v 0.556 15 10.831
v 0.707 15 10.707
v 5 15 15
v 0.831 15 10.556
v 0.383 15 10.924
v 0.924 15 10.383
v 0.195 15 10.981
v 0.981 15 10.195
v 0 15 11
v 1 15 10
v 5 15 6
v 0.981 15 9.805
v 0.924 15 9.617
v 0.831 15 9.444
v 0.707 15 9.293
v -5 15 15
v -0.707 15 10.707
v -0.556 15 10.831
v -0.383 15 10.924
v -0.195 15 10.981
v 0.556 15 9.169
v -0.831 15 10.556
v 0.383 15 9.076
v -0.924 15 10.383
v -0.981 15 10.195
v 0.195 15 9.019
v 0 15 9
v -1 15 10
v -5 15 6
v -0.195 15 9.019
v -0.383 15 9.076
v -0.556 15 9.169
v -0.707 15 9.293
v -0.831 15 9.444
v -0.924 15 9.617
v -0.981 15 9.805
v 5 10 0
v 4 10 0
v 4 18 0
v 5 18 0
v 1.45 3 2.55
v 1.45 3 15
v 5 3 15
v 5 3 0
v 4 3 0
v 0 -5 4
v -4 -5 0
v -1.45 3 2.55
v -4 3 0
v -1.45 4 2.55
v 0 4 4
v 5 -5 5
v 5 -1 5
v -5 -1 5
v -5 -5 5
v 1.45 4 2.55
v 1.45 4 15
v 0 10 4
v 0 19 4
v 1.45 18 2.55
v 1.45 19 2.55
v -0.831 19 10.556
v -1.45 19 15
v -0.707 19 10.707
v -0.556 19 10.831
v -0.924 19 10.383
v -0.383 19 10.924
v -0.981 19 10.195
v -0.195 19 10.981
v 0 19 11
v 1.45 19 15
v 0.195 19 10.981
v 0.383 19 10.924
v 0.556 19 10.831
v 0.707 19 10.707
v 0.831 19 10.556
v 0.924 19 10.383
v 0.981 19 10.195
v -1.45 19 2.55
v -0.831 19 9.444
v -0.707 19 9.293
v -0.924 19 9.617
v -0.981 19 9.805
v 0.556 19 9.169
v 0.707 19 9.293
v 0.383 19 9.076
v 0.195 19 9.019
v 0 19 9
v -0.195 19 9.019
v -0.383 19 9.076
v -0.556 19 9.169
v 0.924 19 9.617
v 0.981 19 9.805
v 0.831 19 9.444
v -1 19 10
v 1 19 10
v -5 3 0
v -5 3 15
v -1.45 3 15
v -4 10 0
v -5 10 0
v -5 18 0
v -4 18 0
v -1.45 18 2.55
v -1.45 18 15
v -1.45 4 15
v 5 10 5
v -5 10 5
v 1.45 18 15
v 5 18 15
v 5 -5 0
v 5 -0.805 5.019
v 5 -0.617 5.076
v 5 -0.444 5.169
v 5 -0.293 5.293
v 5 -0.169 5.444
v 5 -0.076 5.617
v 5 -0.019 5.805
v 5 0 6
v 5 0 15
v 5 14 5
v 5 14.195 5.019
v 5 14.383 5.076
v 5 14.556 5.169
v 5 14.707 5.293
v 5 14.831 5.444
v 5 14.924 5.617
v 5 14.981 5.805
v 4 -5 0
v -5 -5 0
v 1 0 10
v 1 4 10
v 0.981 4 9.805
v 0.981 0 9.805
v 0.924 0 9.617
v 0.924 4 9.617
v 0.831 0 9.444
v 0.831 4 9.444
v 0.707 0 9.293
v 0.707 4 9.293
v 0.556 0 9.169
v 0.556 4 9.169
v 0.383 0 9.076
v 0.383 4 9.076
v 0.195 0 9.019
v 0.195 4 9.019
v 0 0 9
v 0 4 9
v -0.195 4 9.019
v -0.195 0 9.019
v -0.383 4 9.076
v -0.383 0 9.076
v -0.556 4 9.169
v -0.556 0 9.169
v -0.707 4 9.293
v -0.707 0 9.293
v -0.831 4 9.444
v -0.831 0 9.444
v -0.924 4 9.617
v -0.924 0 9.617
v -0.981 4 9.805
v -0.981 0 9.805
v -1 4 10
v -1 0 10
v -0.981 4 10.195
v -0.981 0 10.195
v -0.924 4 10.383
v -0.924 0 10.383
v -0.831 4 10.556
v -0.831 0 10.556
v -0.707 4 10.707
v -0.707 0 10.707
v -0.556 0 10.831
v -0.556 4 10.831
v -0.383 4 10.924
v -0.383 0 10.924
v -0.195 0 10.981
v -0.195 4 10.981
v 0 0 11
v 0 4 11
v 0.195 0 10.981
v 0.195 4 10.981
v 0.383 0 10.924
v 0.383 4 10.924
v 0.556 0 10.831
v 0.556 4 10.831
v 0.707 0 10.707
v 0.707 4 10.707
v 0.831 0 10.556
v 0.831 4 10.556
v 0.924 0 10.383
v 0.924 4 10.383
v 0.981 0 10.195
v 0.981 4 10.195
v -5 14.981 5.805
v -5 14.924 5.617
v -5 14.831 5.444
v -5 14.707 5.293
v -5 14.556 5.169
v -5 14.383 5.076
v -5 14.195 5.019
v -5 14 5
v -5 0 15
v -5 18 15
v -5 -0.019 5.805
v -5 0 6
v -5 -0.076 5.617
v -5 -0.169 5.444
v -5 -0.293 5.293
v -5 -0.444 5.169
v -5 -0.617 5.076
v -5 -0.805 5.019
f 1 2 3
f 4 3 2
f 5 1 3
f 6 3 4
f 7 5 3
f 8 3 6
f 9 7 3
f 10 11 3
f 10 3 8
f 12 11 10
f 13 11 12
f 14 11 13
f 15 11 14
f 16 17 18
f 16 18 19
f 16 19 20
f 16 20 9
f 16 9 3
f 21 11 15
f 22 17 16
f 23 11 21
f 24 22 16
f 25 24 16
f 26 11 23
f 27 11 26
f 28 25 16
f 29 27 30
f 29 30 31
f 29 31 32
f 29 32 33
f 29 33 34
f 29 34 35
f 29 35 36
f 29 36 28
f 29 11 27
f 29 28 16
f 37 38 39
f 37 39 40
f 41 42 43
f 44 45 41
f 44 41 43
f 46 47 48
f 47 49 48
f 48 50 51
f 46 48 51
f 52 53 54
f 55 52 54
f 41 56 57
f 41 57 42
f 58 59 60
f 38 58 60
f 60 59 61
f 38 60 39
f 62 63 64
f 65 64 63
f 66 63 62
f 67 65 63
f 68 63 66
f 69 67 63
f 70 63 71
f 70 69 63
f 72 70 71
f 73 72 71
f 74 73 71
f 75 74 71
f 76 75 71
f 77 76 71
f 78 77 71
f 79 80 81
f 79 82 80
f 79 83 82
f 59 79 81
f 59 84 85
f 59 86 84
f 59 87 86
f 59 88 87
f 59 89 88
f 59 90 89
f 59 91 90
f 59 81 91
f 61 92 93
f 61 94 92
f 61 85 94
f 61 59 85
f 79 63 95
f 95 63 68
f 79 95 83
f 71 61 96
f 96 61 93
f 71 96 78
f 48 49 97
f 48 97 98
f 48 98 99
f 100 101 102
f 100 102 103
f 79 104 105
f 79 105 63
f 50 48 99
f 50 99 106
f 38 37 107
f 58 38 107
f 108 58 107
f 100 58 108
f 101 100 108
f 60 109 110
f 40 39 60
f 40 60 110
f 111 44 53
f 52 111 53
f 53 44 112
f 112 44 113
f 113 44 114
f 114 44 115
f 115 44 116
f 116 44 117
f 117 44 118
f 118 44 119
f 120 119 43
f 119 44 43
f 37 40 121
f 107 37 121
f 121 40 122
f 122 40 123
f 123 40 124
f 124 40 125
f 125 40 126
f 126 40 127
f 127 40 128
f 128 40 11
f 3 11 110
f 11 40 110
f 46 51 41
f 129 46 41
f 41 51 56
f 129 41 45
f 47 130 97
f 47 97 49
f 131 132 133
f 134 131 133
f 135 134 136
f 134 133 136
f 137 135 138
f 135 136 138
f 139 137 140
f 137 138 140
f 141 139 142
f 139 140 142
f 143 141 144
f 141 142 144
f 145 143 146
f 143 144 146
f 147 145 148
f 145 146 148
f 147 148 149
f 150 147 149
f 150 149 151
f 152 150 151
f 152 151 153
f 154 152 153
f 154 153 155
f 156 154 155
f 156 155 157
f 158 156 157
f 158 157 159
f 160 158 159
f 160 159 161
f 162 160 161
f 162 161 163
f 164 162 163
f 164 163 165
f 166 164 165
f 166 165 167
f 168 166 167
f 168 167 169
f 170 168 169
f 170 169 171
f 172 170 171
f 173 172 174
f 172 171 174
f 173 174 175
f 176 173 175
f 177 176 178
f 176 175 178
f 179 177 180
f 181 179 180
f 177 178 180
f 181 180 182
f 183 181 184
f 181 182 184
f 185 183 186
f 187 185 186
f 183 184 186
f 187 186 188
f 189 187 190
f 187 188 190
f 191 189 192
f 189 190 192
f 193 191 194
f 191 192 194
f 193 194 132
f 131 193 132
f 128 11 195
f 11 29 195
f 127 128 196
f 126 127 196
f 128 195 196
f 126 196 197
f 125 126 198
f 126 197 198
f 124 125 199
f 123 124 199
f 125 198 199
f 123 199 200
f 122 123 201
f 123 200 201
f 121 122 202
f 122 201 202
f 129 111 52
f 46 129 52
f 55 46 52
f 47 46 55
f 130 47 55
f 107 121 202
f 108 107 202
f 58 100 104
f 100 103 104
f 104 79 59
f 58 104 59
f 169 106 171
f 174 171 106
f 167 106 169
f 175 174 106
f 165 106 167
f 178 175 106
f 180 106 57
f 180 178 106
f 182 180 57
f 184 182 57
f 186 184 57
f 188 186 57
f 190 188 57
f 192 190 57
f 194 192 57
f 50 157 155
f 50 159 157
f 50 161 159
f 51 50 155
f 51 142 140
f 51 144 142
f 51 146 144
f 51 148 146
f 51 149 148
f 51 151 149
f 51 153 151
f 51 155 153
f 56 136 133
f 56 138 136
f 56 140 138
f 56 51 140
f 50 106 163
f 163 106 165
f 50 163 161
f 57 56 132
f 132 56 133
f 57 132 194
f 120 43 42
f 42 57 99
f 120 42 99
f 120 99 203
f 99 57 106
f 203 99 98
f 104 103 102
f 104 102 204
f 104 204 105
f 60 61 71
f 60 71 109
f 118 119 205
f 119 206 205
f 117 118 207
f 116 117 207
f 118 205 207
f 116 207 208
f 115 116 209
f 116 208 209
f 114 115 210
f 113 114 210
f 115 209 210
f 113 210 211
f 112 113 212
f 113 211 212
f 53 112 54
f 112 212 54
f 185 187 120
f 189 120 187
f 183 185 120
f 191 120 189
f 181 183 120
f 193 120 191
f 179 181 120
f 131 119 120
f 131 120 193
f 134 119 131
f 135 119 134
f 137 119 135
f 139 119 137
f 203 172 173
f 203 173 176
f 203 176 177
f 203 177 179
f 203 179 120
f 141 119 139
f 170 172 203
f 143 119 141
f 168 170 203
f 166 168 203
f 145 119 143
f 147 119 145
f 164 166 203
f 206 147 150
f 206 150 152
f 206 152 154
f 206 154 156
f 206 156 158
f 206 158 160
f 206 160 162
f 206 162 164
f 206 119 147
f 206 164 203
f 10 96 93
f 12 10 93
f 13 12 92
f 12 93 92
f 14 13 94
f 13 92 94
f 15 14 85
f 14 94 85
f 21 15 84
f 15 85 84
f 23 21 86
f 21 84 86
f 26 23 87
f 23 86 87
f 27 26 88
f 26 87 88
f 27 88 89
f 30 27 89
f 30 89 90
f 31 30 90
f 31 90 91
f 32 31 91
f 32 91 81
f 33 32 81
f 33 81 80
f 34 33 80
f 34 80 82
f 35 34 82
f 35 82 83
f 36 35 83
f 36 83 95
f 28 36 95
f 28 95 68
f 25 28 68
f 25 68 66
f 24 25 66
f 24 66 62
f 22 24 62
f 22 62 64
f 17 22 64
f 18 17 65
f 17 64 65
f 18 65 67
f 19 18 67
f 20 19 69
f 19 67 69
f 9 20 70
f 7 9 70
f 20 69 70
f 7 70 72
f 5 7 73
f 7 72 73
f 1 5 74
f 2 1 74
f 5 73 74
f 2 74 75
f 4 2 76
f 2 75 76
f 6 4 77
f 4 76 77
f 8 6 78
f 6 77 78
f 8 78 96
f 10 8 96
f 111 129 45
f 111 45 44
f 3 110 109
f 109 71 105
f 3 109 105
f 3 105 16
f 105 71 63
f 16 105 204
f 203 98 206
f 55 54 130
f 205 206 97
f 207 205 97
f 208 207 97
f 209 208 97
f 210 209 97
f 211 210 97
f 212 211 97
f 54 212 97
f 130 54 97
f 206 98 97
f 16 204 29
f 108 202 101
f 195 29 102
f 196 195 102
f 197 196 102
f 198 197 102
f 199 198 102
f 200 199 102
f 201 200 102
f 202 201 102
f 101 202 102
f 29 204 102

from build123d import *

# Parameters (mm, degrees)
MAIN_DEPTH          = 15
ESQUISSE2_R         = 1
TOPHOLE_DEPTH       = 5
CUT_EXTRUDE1_DEPTH  = 5
BOSS_EXTRUDE1_DEPTH = 5
FILLET1_R           = 1
LPATTERN1_COUNT     = 2
LPATTERN1_PITCH     = 15


with BuildPart() as part:
    # Esquisse1 → Main (new body)
    with BuildSketch(Plane.XY):
        Polygon((-5, 0), (-5, 3), (-1.45, 3), (-1.45, 4), (1.45, 4), (1.45, 3), (5, 3), (5, 0), align=None)
    extrude(amount=MAIN_DEPTH)

    # Esquisse2 → TopHole (cut, through all)
    with BuildSketch(Plane(origin=(0, 4, 0), x_dir=(1, 0, 0), z_dir=(0, 1, 0))):
        with Locations((0, -10)):
            Circle(ESQUISSE2_R)
    extrude(amount=-TOPHOLE_DEPTH, mode=Mode.SUBTRACT)

    # Sketch1 → Cut-Extrude1 (cut, through all)
    with BuildSketch(Plane(origin=(0, 0, 0), x_dir=(-1, 0, 0), z_dir=(0, -1, 0))):
        Polygon((5, 1), (0, -4), (-5, 1), align=None)
    extrude(amount=-CUT_EXTRUDE1_DEPTH, mode=Mode.SUBTRACT)

    # Sketch2 → Boss-Extrude1 (add)
    with BuildSketch(Plane(origin=(0, 0, 0), x_dir=(-1, 0, 0), z_dir=(0, -1, 0))):
        Polygon((-5, 0), (-5, -5), (5, -5), (5, 0), (4, 0), (0, -4), (-4, 0), align=None)
    extrude(amount=BOSS_EXTRUDE1_DEPTH)

    # Fillet1
    fillet1_edges = [part.edges().sort_by_distance(p)[0] for p in [
        (0, 0, 5),
    ]]
    fillet(fillet1_edges, radius=FILLET1_R)


with BuildPart() as lpattern1_1:
    # LPattern1: pattern copy
    add(part.part.moved(Location(Vector(0, 1, 0) * (1 * LPATTERN1_PITCH))))


solid = Compound([part.part, lpattern1_1.part])
